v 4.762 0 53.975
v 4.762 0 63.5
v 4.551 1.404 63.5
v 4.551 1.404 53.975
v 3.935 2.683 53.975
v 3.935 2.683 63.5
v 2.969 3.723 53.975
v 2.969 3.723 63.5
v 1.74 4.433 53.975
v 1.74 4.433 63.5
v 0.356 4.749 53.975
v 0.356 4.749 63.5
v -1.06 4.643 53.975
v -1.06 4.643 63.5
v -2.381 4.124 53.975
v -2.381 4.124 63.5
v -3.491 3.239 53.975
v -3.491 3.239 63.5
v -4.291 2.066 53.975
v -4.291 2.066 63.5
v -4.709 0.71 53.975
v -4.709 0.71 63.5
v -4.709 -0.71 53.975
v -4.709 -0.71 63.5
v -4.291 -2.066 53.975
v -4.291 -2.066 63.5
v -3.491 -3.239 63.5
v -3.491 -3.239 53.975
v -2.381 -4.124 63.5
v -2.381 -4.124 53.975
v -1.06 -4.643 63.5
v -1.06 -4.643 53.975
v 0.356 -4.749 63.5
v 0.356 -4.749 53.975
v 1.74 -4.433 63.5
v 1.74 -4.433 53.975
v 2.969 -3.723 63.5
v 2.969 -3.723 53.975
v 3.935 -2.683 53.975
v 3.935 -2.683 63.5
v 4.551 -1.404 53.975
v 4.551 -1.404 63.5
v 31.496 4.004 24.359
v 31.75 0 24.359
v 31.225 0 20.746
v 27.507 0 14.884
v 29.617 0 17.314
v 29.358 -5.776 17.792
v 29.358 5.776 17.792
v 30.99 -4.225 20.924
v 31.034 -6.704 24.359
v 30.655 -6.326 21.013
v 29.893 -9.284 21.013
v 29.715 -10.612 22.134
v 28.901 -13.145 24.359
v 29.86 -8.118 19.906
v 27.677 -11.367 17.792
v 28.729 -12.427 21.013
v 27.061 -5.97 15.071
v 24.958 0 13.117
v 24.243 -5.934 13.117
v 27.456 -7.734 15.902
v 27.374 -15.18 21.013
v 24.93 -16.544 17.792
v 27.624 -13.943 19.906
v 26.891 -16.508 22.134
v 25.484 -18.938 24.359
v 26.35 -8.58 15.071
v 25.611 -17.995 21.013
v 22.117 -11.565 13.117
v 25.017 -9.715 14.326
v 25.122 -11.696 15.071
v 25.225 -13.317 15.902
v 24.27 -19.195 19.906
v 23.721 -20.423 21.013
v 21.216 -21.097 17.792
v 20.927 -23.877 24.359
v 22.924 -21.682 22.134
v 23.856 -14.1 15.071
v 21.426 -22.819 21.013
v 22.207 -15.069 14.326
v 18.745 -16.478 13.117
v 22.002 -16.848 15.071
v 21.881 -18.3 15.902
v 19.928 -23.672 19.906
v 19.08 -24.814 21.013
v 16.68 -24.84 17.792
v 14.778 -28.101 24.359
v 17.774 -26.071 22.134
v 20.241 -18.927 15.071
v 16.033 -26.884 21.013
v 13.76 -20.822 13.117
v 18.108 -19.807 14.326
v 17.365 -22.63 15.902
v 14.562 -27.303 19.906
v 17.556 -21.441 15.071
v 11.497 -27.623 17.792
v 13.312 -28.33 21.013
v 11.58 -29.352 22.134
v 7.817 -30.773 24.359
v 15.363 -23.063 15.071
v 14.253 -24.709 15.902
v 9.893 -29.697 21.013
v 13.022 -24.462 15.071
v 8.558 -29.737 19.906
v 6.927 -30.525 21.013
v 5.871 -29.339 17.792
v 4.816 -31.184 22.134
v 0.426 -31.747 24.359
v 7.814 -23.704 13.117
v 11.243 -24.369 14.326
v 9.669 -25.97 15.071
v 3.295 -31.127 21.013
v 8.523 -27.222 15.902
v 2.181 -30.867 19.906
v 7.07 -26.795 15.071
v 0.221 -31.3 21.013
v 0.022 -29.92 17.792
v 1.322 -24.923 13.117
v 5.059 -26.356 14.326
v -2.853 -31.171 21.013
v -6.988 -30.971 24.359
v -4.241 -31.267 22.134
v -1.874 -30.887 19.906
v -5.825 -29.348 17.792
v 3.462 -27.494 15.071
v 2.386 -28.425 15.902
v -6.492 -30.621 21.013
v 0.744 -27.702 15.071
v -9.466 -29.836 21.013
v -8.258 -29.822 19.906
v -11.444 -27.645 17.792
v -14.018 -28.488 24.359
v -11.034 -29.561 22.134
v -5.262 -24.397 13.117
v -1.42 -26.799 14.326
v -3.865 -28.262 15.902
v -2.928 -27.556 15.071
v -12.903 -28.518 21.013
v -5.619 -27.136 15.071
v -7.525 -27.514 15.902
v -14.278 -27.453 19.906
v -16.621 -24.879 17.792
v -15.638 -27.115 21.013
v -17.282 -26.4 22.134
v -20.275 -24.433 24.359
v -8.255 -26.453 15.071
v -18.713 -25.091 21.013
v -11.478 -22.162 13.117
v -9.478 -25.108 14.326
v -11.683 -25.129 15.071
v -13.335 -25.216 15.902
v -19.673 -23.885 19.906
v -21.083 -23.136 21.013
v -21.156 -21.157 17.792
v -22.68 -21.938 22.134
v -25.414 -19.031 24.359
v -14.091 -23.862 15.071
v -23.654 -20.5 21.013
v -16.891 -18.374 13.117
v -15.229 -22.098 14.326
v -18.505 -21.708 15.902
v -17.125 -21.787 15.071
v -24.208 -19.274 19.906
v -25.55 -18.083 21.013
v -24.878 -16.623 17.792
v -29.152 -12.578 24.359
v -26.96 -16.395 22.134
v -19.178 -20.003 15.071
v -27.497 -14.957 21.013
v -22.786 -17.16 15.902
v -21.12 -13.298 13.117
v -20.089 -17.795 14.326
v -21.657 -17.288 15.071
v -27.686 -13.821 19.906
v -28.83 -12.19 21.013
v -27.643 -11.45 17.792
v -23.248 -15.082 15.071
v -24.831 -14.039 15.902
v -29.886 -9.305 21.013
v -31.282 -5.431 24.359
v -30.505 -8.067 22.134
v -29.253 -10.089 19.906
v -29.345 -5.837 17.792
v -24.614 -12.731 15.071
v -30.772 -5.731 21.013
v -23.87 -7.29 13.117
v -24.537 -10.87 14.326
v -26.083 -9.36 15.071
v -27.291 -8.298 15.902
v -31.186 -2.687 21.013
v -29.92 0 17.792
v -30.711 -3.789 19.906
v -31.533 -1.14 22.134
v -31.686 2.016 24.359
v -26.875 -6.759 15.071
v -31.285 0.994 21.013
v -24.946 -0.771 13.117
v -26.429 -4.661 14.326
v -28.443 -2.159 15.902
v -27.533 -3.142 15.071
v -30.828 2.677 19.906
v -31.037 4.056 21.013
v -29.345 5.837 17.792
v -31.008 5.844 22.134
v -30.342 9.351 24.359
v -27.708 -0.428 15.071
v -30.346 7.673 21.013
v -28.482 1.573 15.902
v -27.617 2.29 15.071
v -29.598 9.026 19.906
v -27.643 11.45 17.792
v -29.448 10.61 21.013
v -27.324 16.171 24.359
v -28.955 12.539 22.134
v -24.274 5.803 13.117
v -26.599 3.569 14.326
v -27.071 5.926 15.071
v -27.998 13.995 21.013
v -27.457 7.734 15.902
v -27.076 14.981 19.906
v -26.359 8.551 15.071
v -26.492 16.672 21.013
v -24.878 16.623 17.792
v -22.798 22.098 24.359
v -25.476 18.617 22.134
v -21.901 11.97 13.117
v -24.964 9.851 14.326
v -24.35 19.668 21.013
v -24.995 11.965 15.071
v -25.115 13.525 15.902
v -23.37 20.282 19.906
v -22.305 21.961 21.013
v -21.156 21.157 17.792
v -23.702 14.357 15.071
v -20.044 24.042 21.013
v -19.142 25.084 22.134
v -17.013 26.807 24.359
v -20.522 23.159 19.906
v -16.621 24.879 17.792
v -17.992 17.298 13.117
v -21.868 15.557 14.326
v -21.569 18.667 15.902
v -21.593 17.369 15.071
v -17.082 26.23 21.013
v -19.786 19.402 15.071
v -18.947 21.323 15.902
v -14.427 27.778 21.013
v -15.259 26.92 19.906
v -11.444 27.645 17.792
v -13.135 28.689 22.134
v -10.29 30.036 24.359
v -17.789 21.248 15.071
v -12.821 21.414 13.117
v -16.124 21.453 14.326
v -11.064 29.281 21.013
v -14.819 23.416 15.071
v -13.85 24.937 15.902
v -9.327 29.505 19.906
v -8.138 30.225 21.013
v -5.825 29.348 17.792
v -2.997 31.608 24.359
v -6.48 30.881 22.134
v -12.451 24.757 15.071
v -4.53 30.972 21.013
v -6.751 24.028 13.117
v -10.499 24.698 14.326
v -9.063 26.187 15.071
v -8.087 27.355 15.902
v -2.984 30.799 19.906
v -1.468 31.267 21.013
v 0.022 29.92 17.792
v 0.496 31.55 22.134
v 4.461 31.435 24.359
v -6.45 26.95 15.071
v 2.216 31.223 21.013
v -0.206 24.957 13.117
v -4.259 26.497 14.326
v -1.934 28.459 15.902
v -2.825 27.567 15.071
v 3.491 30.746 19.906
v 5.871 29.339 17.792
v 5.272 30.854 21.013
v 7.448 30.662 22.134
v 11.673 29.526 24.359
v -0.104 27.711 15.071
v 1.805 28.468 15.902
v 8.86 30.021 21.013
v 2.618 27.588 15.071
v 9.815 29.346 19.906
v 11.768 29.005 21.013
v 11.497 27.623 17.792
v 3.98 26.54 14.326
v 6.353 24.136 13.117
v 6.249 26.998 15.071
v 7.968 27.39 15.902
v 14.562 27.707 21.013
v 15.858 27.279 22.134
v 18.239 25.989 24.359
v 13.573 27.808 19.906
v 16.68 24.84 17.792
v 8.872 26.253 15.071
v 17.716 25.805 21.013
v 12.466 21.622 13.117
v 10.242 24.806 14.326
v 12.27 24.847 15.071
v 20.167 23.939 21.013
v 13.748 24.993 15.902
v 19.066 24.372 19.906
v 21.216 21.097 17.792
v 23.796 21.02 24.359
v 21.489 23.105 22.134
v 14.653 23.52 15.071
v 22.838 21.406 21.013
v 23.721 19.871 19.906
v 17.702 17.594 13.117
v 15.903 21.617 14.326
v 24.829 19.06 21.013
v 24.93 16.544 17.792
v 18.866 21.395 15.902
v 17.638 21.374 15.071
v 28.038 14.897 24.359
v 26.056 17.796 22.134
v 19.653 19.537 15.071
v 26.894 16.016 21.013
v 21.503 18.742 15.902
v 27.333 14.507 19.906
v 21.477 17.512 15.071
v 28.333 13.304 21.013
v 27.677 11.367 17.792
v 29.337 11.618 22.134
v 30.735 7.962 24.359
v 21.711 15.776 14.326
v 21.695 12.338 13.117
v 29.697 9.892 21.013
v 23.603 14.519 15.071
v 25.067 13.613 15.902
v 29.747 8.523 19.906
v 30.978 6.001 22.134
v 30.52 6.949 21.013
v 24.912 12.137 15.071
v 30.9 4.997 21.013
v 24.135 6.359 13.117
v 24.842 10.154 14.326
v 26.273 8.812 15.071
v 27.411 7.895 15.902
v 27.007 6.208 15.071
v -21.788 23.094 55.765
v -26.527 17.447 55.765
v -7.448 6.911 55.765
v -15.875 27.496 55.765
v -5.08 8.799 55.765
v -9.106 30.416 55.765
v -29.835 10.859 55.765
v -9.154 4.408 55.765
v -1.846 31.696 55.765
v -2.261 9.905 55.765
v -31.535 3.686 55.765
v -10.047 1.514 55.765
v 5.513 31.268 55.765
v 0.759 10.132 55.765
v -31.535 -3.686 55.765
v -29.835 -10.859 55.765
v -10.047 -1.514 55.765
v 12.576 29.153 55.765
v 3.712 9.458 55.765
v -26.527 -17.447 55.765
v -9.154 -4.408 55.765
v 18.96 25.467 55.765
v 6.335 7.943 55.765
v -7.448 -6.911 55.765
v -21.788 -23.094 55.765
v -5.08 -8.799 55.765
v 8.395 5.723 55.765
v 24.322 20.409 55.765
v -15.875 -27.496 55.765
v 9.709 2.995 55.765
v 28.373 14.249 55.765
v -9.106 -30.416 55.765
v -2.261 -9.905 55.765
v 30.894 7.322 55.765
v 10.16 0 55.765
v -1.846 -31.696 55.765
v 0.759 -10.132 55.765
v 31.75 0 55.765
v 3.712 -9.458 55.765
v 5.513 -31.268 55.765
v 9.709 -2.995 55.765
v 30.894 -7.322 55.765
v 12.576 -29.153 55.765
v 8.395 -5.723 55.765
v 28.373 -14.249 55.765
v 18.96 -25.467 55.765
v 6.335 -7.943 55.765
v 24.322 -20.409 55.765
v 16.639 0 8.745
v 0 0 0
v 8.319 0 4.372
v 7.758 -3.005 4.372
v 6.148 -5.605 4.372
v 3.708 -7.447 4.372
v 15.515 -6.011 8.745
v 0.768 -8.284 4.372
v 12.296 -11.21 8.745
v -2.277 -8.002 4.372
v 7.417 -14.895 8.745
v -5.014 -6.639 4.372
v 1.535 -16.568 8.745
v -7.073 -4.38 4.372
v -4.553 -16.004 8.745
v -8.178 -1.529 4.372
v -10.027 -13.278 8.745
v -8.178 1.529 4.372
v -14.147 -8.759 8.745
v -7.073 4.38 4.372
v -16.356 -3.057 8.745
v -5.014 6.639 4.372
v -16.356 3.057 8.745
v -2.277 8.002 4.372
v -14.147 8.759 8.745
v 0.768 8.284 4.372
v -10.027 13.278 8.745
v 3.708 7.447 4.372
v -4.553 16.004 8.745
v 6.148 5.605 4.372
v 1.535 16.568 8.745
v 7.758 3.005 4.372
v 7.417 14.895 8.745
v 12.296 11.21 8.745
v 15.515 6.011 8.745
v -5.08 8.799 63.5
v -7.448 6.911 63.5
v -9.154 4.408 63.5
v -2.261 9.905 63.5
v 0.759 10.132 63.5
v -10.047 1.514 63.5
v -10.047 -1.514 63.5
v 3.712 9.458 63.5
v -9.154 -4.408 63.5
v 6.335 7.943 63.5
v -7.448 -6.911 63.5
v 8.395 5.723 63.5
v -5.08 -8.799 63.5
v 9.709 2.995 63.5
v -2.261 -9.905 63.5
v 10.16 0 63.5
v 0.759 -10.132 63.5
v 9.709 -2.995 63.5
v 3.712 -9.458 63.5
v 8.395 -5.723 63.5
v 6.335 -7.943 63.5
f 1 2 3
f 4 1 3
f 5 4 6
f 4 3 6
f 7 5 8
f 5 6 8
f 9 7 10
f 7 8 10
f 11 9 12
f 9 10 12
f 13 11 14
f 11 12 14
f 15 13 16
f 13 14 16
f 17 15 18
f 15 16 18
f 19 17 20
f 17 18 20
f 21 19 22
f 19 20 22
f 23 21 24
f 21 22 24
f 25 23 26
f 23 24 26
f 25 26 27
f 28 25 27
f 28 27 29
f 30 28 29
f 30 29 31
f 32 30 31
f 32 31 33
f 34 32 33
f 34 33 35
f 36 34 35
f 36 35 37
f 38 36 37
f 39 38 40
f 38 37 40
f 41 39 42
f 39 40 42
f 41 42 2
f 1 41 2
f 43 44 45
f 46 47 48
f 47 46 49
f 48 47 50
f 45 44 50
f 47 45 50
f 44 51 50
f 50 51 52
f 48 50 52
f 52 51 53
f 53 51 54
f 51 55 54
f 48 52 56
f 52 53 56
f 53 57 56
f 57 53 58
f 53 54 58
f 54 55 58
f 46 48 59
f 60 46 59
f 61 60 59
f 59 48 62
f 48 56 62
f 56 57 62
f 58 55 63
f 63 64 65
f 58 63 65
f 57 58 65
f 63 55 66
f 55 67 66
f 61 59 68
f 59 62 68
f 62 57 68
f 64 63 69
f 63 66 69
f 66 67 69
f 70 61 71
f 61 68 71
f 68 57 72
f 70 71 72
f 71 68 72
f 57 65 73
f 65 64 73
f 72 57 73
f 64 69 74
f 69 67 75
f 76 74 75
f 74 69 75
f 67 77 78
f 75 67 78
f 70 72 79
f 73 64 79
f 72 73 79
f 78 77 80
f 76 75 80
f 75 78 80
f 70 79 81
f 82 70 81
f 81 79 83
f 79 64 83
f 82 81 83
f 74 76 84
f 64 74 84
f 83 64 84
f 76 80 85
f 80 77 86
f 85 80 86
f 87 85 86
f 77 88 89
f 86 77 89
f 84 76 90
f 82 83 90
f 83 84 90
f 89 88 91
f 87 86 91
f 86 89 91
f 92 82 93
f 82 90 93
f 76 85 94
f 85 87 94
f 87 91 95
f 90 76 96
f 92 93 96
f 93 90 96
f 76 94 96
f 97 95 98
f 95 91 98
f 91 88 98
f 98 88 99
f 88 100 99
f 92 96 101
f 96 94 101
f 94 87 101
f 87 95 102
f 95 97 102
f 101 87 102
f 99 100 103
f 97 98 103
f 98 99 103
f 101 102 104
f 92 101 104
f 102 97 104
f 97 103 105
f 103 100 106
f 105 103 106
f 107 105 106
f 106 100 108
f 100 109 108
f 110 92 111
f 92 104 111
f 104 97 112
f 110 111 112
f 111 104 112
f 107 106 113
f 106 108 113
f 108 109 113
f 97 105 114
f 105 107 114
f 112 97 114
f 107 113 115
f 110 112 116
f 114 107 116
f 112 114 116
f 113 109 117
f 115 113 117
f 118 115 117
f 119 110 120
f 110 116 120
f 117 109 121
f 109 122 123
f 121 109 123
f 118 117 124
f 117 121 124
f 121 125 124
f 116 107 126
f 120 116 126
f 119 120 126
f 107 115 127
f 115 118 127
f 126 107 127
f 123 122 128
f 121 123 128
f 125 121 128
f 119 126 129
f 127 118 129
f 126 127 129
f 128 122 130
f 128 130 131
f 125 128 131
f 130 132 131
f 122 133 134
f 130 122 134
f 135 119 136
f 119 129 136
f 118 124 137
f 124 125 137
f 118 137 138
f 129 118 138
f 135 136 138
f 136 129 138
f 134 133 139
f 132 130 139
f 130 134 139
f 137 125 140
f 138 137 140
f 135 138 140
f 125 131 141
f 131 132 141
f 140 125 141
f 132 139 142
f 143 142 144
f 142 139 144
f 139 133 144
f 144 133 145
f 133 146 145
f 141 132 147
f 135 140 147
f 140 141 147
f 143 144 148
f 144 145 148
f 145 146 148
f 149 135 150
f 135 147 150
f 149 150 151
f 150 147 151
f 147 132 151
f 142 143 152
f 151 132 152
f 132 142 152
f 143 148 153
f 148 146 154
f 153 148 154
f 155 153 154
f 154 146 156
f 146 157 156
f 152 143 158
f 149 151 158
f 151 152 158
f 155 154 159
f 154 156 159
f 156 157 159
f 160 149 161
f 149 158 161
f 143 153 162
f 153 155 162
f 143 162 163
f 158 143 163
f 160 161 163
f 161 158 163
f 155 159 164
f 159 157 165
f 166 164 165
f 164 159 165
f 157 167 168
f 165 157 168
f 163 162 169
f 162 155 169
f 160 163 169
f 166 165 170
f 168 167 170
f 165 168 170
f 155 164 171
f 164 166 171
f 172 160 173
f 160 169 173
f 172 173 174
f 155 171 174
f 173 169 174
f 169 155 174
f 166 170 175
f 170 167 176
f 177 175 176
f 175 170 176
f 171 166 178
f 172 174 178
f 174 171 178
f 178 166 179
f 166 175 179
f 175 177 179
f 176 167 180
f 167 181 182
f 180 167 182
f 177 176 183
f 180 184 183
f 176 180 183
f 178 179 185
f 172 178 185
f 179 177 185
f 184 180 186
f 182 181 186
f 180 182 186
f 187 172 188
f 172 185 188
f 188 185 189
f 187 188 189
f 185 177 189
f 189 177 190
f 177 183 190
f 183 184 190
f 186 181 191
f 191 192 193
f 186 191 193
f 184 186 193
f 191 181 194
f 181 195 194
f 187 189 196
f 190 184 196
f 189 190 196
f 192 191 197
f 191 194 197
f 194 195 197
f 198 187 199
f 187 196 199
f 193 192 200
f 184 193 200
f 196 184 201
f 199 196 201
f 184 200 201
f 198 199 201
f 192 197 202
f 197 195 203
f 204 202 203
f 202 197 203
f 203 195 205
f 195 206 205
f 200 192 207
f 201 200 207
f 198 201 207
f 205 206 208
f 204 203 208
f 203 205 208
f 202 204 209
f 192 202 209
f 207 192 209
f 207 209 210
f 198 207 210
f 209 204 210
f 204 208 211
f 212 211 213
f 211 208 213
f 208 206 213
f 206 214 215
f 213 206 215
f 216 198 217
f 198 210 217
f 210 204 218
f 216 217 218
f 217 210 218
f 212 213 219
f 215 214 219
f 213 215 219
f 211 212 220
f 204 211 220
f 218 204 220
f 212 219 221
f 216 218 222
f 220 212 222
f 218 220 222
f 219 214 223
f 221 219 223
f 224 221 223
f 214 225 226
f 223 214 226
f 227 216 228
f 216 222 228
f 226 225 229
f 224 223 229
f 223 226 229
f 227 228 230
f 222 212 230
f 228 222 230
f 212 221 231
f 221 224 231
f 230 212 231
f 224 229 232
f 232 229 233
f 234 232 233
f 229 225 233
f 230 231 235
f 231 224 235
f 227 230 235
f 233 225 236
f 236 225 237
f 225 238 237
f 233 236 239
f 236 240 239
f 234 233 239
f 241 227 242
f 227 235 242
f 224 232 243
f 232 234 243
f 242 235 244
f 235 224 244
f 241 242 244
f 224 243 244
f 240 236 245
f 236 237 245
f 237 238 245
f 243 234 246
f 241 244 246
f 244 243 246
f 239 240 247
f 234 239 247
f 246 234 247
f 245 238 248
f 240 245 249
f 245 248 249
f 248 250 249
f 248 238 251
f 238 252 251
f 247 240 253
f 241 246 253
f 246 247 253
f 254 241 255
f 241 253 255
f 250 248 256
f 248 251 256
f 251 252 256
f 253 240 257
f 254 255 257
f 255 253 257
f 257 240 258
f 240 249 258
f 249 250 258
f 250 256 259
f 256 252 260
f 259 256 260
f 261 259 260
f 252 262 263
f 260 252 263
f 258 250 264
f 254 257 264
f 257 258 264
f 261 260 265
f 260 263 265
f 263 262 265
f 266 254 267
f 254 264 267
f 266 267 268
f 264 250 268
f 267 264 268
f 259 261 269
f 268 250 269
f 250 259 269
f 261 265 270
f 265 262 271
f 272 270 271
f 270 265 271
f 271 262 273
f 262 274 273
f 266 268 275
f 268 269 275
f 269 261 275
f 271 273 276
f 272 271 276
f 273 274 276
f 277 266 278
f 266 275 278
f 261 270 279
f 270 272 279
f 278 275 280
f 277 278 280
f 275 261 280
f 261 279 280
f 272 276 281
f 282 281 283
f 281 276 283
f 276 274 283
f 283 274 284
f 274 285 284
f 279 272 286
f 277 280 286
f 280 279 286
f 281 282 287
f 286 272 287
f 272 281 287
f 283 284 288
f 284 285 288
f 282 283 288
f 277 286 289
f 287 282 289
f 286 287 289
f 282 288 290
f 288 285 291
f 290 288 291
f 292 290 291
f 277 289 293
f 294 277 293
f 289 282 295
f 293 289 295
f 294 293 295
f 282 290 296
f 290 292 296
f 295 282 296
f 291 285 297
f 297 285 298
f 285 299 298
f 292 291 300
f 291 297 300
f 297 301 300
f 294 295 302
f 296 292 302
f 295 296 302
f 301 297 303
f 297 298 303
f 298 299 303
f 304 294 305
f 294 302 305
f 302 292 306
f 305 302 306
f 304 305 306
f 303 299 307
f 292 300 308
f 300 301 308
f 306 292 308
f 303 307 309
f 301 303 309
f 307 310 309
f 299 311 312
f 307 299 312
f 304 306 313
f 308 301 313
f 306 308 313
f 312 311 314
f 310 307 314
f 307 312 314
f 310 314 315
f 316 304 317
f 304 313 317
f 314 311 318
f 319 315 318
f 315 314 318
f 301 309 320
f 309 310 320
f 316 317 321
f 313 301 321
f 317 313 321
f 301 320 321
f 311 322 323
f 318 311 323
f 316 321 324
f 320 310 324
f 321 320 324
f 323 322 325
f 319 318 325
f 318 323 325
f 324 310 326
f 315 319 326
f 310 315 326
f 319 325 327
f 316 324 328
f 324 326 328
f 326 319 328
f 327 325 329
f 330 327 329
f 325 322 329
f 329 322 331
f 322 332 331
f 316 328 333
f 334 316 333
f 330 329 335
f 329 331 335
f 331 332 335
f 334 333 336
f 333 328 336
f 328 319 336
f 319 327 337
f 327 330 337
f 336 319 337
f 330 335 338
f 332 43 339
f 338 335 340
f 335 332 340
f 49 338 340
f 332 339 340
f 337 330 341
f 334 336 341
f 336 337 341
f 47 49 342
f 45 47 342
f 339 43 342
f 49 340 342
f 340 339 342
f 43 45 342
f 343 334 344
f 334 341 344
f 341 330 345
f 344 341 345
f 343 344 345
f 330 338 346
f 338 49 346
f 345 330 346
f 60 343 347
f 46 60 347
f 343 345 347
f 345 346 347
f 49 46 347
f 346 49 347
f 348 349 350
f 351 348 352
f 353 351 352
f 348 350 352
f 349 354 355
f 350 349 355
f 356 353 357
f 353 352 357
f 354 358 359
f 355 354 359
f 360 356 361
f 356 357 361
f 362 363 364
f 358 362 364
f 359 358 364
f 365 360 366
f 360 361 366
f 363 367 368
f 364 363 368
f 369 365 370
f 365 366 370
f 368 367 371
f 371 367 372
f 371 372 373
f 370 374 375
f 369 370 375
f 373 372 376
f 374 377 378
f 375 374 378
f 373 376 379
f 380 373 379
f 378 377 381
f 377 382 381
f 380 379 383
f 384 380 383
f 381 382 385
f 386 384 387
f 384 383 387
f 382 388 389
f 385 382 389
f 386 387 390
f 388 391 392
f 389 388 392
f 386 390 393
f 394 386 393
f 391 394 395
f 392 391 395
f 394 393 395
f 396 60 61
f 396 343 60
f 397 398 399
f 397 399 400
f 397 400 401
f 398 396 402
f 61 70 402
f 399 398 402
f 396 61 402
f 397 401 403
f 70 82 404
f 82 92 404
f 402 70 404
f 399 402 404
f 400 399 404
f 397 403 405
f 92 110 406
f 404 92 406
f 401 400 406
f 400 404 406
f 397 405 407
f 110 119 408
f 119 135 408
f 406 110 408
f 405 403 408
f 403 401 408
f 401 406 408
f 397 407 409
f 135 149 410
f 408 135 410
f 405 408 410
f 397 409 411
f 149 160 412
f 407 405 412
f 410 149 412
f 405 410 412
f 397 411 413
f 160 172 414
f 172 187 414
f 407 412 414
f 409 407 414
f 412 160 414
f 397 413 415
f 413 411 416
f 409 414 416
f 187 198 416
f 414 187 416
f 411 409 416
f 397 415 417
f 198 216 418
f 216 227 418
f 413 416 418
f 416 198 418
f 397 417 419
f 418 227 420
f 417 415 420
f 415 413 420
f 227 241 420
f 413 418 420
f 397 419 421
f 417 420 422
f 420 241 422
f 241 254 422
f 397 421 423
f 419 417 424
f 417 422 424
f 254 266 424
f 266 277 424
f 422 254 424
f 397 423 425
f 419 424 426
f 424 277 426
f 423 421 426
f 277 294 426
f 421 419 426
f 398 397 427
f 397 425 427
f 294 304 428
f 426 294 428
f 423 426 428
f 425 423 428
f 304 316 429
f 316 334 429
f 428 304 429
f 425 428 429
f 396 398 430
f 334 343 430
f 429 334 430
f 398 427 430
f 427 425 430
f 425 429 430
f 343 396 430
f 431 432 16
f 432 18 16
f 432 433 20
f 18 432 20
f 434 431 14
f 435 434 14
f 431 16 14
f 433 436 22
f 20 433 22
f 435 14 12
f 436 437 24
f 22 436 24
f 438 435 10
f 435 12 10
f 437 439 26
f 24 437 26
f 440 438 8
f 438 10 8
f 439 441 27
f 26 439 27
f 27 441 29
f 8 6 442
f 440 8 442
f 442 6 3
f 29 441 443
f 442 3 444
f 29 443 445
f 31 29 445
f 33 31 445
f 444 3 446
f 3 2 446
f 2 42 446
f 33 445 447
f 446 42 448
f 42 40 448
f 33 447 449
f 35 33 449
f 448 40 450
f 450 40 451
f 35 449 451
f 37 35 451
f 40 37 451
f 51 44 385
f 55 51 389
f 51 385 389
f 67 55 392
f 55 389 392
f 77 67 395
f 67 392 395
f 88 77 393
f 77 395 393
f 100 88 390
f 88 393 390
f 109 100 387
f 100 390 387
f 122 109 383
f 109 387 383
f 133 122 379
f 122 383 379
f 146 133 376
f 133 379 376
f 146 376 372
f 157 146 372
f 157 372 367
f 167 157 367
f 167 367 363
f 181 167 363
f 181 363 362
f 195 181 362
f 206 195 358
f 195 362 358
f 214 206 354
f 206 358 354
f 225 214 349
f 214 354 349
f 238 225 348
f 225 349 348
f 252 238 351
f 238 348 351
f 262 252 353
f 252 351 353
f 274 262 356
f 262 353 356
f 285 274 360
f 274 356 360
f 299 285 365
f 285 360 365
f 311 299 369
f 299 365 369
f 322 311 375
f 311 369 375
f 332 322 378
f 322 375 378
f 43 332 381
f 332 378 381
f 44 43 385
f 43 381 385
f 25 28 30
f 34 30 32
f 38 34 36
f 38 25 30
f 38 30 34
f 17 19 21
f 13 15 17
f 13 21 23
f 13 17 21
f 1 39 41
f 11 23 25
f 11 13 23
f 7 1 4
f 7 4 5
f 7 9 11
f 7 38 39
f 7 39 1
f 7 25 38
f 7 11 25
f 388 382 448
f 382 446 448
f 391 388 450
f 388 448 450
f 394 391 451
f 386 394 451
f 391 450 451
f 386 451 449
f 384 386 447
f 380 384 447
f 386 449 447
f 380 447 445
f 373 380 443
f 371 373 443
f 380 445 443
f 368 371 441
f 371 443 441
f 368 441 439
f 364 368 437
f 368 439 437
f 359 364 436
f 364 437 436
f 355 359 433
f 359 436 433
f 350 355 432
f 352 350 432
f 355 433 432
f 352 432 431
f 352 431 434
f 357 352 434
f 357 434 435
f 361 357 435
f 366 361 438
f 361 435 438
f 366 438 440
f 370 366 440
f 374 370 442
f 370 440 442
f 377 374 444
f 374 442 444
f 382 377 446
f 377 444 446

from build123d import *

# Parameters (mm, degrees)
F2_R     = 4.7625
F3_DEPTH = 9.525
F5_R     = 12.7


# Not quite as in the source:
# - the program builds the solid bodies; features that only make, move or delete a surface that nothing else refers to are left out


with BuildPart() as f1:
    # F0 (on Front) → F1 (revolve)
    with BuildSketch(Plane.XZ):
        Polygon((10.16, 55.7645447552), (10.16, 63.5), (0, 63.5), (0, 0), (31.75, 16.6865773499), (31.75, 28.8652195452), (31.75, 46.2049523592), (31.75, 55.7645447552), align=None)
    revolve(axis=Axis((0, 0, 31.75), (0, 0, -1)))

    # F2 (on face) → F3 (cut)
    with BuildSketch(Plane.XY.offset(63.5)):
        Circle(F2_R)
    extrude(amount=-F3_DEPTH, mode=Mode.SUBTRACT)

    # F5
    f5_edges = [f1.edges().sort_by_distance(p)[0] for p in [
        (-31.75, 0, 16.686577),
    ]]
    fillet(f5_edges, radius=F5_R)


solid = f1.part
